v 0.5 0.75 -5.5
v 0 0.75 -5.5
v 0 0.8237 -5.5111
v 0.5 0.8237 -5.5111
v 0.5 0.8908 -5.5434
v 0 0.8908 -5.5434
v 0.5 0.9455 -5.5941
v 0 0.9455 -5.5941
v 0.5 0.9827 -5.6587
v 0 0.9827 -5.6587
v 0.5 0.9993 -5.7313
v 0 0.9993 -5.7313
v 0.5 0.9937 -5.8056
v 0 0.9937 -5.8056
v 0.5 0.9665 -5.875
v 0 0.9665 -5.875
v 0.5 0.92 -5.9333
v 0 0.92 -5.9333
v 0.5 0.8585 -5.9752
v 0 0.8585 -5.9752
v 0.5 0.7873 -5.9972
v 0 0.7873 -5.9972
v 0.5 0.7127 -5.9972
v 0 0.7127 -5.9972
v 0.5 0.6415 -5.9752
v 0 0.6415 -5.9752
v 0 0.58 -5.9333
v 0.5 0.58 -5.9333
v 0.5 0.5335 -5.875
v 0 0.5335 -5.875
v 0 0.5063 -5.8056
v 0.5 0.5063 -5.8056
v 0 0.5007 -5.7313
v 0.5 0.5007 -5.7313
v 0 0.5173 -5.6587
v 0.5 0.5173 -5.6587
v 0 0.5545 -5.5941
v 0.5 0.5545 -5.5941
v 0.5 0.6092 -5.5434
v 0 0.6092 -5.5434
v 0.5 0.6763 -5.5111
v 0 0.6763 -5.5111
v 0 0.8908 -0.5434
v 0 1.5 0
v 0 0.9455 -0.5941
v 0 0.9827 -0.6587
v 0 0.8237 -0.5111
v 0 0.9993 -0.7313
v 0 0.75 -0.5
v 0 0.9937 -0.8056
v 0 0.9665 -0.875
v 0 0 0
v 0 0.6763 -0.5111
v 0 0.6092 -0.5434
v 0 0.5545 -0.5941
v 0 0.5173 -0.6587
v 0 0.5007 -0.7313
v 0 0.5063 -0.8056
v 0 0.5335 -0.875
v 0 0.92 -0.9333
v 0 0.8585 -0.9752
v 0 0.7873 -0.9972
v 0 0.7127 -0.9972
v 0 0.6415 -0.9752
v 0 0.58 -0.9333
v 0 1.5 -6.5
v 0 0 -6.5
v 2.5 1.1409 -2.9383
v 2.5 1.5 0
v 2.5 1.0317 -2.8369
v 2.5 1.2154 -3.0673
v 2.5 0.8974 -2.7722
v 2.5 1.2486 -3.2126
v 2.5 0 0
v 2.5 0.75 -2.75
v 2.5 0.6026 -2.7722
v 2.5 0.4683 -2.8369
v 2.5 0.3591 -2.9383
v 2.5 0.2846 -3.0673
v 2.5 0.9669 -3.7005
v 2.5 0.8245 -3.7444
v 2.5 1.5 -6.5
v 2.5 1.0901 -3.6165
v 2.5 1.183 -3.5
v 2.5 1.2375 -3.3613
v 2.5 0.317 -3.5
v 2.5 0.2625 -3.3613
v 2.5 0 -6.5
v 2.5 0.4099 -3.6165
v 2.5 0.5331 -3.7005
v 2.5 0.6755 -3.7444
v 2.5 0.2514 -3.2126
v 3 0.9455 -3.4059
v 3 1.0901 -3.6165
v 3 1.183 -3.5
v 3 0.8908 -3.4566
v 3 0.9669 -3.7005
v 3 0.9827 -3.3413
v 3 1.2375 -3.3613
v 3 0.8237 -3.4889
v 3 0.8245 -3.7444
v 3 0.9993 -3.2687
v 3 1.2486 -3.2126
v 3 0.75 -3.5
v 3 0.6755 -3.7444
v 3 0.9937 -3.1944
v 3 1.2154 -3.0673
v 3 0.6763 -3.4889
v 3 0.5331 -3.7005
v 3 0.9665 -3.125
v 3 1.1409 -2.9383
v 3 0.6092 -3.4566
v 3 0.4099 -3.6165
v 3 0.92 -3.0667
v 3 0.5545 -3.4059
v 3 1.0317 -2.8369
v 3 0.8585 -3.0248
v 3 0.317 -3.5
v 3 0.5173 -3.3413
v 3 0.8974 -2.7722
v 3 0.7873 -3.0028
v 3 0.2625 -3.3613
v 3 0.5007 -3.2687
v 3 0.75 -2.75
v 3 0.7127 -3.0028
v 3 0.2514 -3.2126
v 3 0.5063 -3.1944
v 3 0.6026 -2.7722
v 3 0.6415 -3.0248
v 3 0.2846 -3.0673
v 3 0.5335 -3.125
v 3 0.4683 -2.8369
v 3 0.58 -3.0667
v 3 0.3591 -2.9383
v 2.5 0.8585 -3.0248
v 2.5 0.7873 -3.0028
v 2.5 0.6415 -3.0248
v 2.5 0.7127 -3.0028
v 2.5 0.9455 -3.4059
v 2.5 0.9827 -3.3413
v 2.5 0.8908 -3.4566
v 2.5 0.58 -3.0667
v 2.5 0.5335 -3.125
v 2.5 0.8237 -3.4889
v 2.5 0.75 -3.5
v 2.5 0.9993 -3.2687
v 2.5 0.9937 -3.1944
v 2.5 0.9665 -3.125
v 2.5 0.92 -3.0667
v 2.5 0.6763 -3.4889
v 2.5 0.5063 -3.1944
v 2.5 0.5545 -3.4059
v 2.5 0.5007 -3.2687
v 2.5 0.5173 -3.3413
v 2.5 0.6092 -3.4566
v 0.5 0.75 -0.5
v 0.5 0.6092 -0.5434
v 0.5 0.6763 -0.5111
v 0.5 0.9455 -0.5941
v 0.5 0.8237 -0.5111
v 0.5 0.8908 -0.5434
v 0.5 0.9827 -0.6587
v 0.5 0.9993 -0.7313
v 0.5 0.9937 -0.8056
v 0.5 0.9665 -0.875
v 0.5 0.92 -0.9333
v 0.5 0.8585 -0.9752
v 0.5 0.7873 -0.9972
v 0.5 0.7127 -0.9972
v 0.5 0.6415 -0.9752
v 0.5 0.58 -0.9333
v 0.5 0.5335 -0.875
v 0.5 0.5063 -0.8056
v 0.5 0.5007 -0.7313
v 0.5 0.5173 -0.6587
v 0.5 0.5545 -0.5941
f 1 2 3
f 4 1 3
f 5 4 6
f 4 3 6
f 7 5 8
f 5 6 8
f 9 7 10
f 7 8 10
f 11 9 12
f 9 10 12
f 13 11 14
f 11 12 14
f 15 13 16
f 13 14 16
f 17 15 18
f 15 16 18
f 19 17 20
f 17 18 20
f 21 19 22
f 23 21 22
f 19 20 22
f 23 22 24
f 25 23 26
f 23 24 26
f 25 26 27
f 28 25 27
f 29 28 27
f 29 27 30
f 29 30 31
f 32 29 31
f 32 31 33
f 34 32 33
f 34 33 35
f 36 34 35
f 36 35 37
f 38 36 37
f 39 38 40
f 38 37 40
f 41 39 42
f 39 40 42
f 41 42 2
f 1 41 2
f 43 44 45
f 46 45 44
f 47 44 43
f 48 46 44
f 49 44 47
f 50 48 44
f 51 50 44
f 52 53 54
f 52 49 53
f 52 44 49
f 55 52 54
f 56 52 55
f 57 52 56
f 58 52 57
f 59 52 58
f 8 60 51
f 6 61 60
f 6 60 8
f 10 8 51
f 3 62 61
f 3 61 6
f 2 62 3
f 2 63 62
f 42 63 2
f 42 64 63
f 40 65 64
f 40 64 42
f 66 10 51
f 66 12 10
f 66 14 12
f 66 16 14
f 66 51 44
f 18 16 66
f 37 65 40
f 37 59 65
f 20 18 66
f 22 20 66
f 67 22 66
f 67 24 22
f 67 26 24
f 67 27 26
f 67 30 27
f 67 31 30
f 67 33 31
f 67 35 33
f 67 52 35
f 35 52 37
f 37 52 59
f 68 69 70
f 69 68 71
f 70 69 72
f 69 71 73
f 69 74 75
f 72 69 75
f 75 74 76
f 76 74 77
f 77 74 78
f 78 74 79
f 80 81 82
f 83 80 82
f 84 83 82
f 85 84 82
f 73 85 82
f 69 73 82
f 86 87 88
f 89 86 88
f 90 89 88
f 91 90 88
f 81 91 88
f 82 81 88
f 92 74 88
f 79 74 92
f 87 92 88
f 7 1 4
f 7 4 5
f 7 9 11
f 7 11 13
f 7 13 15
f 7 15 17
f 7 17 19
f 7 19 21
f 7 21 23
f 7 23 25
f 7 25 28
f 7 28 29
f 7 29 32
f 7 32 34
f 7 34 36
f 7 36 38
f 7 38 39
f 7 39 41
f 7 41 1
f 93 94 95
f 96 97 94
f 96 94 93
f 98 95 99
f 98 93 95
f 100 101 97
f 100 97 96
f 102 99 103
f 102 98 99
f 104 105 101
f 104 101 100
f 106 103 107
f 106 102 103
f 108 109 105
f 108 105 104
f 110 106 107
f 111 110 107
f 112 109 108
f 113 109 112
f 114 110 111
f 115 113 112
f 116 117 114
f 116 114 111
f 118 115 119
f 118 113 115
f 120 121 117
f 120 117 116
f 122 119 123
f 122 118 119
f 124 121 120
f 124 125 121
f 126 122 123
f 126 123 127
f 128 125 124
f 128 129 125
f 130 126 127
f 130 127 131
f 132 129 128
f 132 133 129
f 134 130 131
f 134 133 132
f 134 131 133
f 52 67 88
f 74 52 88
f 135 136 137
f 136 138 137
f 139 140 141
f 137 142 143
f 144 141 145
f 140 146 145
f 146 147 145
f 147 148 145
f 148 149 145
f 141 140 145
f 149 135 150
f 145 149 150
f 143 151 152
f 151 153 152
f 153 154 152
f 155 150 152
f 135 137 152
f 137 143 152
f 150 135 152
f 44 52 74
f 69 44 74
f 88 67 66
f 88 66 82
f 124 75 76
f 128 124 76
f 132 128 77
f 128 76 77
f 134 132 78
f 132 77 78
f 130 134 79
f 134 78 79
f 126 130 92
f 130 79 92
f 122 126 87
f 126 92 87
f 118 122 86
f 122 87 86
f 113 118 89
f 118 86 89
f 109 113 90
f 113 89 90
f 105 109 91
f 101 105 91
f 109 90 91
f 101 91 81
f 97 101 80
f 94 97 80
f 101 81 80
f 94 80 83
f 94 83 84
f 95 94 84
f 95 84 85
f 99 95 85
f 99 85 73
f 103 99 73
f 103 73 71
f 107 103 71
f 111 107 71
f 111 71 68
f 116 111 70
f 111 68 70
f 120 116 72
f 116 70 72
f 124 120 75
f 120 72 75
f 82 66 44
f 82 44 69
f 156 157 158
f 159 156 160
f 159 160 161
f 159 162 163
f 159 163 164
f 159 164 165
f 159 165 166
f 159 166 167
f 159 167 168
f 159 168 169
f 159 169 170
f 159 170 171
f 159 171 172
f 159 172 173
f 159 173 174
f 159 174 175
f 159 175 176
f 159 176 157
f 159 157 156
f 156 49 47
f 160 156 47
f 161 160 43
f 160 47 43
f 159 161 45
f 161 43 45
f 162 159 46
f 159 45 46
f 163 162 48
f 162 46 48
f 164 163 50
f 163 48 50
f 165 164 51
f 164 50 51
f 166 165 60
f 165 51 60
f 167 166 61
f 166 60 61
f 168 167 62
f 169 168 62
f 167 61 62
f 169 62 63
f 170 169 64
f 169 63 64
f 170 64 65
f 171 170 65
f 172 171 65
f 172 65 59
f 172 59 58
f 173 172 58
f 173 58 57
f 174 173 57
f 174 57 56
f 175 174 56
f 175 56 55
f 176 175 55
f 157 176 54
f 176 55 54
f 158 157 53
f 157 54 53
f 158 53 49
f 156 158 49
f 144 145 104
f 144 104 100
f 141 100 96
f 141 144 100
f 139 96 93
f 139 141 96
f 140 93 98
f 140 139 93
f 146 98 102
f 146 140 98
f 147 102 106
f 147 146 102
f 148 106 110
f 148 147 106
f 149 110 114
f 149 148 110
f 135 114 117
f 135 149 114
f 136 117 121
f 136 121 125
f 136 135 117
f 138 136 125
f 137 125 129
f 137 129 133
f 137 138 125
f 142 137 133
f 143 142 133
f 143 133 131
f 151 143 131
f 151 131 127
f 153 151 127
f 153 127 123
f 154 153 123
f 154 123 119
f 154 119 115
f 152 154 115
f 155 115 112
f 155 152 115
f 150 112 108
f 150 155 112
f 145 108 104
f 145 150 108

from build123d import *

# Parameters (mm, degrees)
SKETCH1_W           = 2.5
SKETCH1_H           = 6.5
BOSS_EXTRUDE1_DEPTH = 1.5
SKETCH2_R           = 0.5
SKETCH2_R_2         = 0.25
BOSS_EXTRUDE2_DEPTH = 0.5
SKETCH4_R           = 0.25
CUT_EXTRUDE1_DEPTH  = 0.5


with BuildPart() as part:
    # Sketch1 → Boss-Extrude1 (new body)
    with BuildSketch(Plane(origin=(0, 0, 0), x_dir=(1, 0, 0), z_dir=(0, 1, 0))):
        with Locations((1.25, 3.25)):
            Rectangle(SKETCH1_W, SKETCH1_H)
    extrude(amount=BOSS_EXTRUDE1_DEPTH)

    # Sketch2 → Boss-Extrude2 (add)
    with BuildSketch(Plane(origin=(2.5, 0, 0), x_dir=(0, 0, -1), z_dir=(1, 0, 0))):
        with Locations(Location((3.25, 0.75, 0), (0, 0, 180))):
            Circle(SKETCH2_R)
        with Locations((3.25, 0.75)):
            Circle(SKETCH2_R_2, mode=Mode.SUBTRACT)
    extrude(amount=BOSS_EXTRUDE2_DEPTH)

    # Sketch4 → Cut-Extrude1 (cut)
    with BuildSketch(Plane.ZY):
        with Locations((-5.75, 0.75)):
            Circle(SKETCH4_R)
        with Locations((-0.75, 0.75)):
            Circle(SKETCH4_R)
    extrude(amount=-CUT_EXTRUDE1_DEPTH, mode=Mode.SUBTRACT)


solid = part.part
